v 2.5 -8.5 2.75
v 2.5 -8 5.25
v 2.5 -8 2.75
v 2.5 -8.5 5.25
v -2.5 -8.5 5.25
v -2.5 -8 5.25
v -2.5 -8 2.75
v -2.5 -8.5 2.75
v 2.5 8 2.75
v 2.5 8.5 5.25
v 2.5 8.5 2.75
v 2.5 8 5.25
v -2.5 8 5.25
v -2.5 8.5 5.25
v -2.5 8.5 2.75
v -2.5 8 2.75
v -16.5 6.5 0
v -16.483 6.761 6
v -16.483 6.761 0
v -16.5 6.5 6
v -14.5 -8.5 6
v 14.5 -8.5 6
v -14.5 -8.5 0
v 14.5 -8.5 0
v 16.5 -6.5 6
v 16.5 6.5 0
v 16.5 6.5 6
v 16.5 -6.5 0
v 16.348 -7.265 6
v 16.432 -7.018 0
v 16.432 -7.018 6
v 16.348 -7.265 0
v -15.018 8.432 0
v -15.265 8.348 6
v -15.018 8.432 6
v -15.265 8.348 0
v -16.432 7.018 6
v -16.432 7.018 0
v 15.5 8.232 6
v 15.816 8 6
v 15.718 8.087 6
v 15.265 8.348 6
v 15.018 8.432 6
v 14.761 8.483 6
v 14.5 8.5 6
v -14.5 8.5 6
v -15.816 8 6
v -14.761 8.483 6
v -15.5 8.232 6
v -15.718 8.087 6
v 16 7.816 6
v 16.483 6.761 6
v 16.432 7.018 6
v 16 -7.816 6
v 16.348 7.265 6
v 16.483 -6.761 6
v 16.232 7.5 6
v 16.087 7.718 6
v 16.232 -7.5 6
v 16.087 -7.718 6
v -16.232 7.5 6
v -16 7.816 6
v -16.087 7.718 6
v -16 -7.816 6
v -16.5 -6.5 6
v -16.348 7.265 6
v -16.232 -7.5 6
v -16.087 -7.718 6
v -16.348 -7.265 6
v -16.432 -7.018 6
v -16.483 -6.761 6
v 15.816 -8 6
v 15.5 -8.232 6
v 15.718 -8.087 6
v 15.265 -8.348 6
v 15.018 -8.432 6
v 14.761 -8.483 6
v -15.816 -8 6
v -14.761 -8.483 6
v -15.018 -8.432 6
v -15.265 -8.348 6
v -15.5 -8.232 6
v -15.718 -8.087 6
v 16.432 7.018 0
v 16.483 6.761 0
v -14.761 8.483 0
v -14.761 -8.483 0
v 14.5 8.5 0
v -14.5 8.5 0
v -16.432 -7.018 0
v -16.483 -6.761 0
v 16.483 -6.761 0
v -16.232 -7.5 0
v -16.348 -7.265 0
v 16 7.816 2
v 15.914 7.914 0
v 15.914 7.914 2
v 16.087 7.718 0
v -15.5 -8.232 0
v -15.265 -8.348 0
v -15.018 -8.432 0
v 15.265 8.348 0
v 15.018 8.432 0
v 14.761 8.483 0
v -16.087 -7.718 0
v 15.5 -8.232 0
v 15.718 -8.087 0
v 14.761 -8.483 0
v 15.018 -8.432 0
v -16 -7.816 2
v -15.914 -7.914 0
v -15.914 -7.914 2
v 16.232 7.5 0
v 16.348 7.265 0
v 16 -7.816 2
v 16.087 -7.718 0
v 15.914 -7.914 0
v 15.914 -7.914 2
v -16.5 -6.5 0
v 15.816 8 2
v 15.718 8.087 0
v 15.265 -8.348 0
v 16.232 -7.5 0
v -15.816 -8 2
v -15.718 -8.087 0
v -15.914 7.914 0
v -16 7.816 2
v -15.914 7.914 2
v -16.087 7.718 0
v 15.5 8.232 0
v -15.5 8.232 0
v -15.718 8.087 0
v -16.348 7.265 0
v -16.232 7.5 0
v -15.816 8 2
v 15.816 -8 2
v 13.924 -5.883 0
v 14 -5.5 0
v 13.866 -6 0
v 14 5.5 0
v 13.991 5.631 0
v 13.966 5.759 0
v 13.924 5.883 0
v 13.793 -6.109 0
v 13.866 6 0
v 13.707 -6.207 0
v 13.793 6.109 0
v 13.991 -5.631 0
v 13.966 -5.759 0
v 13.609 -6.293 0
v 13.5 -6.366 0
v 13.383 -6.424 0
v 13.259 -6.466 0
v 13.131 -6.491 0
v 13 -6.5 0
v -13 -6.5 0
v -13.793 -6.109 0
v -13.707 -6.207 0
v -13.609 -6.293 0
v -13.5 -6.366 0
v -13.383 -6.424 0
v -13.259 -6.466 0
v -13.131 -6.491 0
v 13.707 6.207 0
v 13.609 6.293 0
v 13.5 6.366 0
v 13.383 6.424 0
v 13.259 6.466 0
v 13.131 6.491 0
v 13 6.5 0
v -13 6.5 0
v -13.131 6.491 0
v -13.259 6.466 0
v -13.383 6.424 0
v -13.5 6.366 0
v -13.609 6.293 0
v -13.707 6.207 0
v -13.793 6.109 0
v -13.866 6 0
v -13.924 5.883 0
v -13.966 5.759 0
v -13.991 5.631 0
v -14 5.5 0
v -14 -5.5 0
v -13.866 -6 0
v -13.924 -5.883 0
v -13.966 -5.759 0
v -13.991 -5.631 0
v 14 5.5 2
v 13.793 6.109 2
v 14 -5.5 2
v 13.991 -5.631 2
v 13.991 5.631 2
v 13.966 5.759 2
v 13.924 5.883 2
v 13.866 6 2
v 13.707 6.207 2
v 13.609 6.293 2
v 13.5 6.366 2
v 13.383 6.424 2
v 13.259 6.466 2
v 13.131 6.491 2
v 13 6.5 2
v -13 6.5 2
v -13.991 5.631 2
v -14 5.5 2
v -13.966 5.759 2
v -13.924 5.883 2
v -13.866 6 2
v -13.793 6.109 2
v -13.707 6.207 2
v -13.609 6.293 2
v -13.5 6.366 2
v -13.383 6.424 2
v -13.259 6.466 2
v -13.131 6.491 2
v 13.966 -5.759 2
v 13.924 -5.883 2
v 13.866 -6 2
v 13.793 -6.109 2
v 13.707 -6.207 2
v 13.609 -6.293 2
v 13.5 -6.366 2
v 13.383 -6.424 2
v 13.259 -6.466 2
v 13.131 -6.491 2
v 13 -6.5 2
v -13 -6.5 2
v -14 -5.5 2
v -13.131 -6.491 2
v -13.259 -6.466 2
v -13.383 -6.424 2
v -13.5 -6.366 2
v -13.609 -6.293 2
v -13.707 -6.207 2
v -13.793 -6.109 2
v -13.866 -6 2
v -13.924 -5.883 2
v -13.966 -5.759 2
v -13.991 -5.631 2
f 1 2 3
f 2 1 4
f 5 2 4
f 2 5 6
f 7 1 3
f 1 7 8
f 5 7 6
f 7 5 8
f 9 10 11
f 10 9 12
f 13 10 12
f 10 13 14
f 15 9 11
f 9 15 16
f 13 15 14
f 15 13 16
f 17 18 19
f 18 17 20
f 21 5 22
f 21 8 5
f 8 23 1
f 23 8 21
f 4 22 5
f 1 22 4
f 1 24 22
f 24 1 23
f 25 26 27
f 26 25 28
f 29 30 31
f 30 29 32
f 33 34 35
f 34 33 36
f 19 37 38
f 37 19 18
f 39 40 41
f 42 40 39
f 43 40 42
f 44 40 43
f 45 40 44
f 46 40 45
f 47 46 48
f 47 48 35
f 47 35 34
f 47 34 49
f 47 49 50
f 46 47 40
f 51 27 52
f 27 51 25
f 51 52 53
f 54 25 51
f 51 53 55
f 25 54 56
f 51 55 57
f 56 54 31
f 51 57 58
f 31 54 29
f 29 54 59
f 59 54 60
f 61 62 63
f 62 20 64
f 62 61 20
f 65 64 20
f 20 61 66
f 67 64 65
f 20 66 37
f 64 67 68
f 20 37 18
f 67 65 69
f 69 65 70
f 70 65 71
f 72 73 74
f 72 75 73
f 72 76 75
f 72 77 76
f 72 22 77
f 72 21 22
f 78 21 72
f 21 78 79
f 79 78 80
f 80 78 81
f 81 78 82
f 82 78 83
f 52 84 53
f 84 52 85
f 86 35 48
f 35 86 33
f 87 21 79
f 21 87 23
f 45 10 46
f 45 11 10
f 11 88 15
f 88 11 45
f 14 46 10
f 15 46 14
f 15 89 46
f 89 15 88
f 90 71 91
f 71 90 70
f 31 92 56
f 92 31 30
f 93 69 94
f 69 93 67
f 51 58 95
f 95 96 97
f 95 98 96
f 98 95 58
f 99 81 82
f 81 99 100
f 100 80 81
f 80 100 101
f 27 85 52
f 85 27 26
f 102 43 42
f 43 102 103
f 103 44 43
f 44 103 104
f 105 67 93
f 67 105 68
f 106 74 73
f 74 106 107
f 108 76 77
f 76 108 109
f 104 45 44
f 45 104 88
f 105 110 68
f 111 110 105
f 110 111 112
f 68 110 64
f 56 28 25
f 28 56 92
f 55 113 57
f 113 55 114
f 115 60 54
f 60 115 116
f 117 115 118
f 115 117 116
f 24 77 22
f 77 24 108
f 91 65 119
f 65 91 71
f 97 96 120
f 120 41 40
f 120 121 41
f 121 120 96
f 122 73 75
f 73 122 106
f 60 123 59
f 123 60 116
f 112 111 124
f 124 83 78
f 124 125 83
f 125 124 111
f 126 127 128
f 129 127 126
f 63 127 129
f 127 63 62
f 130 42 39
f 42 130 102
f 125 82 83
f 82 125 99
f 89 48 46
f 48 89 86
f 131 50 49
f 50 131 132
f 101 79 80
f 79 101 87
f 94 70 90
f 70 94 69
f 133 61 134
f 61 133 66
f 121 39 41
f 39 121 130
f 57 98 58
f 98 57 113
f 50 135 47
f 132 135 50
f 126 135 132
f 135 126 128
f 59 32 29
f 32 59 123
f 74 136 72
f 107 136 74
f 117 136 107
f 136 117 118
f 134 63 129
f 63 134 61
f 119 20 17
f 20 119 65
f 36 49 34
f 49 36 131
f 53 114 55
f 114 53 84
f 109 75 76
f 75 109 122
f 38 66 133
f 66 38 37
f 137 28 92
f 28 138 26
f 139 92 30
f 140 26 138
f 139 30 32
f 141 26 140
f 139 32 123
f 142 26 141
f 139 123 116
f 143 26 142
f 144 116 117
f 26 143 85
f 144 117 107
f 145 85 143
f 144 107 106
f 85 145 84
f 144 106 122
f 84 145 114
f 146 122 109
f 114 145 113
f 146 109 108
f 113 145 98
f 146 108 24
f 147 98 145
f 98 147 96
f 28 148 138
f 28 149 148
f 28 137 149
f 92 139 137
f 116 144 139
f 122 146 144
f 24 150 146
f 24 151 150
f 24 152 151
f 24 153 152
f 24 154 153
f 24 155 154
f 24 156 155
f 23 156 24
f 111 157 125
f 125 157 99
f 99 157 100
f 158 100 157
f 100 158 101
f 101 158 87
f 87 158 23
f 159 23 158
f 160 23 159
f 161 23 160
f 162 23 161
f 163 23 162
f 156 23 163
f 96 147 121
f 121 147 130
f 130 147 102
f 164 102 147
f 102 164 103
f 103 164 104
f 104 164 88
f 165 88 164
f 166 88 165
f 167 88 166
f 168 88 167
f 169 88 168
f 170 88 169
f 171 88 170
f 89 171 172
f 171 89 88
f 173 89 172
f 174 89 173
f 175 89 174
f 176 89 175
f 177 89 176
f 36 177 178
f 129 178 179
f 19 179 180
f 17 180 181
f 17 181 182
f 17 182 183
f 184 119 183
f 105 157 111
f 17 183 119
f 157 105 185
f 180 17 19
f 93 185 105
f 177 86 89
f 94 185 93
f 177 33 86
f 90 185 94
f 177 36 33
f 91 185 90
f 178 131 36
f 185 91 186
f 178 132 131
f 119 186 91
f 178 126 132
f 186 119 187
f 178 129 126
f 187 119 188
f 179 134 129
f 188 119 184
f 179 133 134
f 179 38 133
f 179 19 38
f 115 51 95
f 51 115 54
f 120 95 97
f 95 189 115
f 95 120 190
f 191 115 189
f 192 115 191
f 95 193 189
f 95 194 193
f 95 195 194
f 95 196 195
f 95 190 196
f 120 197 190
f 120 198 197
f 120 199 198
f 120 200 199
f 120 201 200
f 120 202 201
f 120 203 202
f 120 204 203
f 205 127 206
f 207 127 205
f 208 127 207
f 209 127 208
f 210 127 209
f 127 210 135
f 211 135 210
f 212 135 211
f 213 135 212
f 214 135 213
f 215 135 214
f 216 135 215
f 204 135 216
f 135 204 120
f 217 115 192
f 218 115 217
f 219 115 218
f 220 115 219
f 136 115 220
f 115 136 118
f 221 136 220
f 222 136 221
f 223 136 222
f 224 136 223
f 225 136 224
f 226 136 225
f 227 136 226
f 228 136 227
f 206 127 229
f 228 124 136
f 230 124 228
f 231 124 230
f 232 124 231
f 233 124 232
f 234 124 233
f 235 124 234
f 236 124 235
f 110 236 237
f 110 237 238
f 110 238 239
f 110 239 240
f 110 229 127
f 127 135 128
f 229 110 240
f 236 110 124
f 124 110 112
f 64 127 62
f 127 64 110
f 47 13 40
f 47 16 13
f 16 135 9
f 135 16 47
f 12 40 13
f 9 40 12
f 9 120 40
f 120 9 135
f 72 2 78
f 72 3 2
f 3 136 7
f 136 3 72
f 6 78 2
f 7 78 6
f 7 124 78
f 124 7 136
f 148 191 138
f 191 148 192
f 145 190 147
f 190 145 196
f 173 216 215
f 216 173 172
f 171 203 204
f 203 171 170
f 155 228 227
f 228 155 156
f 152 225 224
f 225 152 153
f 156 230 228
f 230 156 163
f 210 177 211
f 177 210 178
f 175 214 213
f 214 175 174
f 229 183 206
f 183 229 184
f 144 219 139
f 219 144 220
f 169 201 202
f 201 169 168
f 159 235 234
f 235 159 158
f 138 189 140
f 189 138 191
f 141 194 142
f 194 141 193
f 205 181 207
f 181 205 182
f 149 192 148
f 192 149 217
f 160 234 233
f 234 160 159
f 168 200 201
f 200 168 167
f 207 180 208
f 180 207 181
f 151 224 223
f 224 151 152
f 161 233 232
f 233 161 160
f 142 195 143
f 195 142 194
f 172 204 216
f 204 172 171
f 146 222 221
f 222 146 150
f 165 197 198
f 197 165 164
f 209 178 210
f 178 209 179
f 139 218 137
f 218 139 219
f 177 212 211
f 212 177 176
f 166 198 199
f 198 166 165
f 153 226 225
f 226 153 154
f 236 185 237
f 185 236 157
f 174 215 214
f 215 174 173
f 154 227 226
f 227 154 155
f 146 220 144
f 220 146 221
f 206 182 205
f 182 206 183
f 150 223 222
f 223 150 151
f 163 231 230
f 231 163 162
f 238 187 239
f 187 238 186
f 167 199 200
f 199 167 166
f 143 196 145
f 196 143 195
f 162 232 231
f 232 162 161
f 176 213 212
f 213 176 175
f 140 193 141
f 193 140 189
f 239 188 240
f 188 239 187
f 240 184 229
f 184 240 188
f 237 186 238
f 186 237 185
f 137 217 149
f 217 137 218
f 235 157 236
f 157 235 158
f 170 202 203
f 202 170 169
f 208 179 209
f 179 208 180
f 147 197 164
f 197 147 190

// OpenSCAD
// file: insert_base.scad
// ============================================
// MODULAR CABLE ORGANIZER - BASE INSERT MODULE
// ============================================
// This is the parent module for all insert types
// Include this file and call insert_with_port() with a port shape
// ============================================

include <parameters.scad>

// === BASE INSERT WITH CUSTOM BODY DEPTH ===
module insert_blank_custom(body_depth) {
    union() {
        // Base plate (sits in frame slot)
        rounded_box_rect(insert_width, insert_height, insert_base_depth, 1.5);
        
        // Body (protrudes out front) - custom depth
        translate([0, 0, insert_base_depth])
            rounded_box_rect(insert_body_width, insert_body_height, body_depth, 2);
        
        // Snap tabs on all 4 sides
        snap_tabs_all();
    }
}

// === BASE INSERT (default depth - for backwards compatibility) ===
module insert_blank() {
    insert_blank_custom(insert_body_depth);
}

// === INSERT WITH THROUGH-HOLE PORT (custom depth) ===
// Pass body_depth and a 2D shape as children
module insert_with_port_custom(body_depth) {
    total_depth = insert_base_depth + body_depth;
    difference() {
        insert_blank_custom(body_depth);
        
        // Cut port hole ALL THE WAY through (tube shape)
        translate([0, 0, -0.1])
            linear_extrude(total_depth + 0.2)
            offset(r=port_clearance)  // Add clearance to port opening
            children();
    }
}

// === INSERT WITH THROUGH-HOLE PORT (default depth) ===
module insert_with_port() {
    insert_with_port_custom(insert_body_depth) children();
}

// === PRE-MADE INSERT MODULES WITH CORRECT DEPTHS ===
module insert_usbc() {
    insert_with_port_custom(usbc_body_depth) port_usbc();
}

module insert_usba() {
    insert_with_port_custom(usba_body_depth) port_usba();
}

module insert_usb_mini() {
    insert_with_port_custom(usb_mini_body_depth) port_usb_mini();
}

module insert_usb_micro() {
    insert_with_port_custom(usb_micro_body_depth) port_usb_micro();
}

module insert_usb_b() {
    insert_with_port_custom(usb_b_body_depth) port_usb_b();
}

module insert_lightning() {
    insert_with_port_custom(lightning_body_depth) port_lightning();
}

module insert_hdmi() {
    insert_with_port_custom(hdmi_body_depth) port_hdmi();
}

module insert_audio_jack() {
    insert_with_port_custom(audio_jack_body_depth) port_audio_jack();
}

// === SNAP TABS (on neck/body - catch on frame cutouts) ===
// Tabs are on the body, positioned to engage with frame wall cutouts
module snap_tabs_all() {
    // Position tabs up on body (clear of base/frame)
    tab_z = insert_base_depth + snap_tab_offset;
    
    // Tabs on all 4 sides of the body
    for (angle = [0, 90, 180, 270]) {
        rotate([0, 0, angle])
            translate([0, insert_body_height/2, tab_z])
            neck_snap_tab();
    }
}

module neck_snap_tab() {
    // Wedge shape (FLIPPED): 
    // - Peak/taper on BOTTOM - slides past back plate when inserting
    // - Flat on TOP - catches and holds
    hull() {
        // Peak of wedge (protruding, at BOTTOM of tab)
        translate([-snap_tab_width/2, snap_tab_protrude, 0])
            cube([snap_tab_width, 0.1, 0.1]);
        // Flat top (at body surface, TOP of tab)
        translate([-snap_tab_width/2, 0, snap_tab_thick])
            cube([snap_tab_width, 0.1, 0.1]);
        // Base of wedge (at body surface, bottom)
        translate([-snap_tab_width/2, 0, 0])
            cube([snap_tab_width, 0.1, 0.1]);
    }
}

module snap_tab_horizontal() {
    hull() {
        translate([0, -snap_tab_protrude/2, 0])
            cube([snap_tab_width, 0.1, snap_tab_thick], center=true);
        translate([0, snap_tab_protrude/2, snap_tab_thick * 0.2])
            cube([snap_tab_width, 0.1, snap_tab_thick * 0.6], center=true);
    }
}

module snap_tab_vertical() {
    hull() {
        translate([-snap_tab_protrude/2, 0, 0])
            cube([0.1, snap_tab_width, snap_tab_thick], center=true);
        translate([snap_tab_protrude/2, 0, snap_tab_thick * 0.2])
            cube([0.1, snap_tab_width, snap_tab_thick * 0.6], center=true);
    }
}

// === UTILITY MODULES ===
module rounded_box_rect(w, d, h, r) {
    translate([0, 0, h/2])
        hull() {
            for (x = [-1, 1], y = [-1, 1])
                translate([x * (w/2 - r), y * (d/2 - r), 0])
                    cylinder(h=h, r=r, center=true);
        }
}

// === PORT SHAPE MODULES (2D) ===
// These define the cutout shapes for each connector type

module port_rounded_rect(w, h, r) {
    // Standard rounded rectangle
    hull() {
        for (x = [-1, 1], y = [-1, 1])
            translate([x * (w/2 - r), y * (h/2 - r)])
                circle(r=r);
    }
}

module port_usbc() {
    port_rounded_rect(usbc_w, usbc_h, usbc_r);
}

module port_usba() {
    port_rounded_rect(usba_w, usba_h, usba_r);
}

module port_usb_mini() {
    port_rounded_rect(usb_mini_w, usb_mini_h, usb_mini_r);
}

module port_usb_micro() {
    port_rounded_rect(usb_micro_w, usb_micro_h, usb_micro_r);
}

module port_usb_b() {
    // USB-B has beveled top corners
    hull() {
        // Bottom corners (full radius)
        for (x = [-1, 1])
            translate([x * (usb_b_w/2 - usb_b_r), -(usb_b_h/2 - usb_b_r)])
                circle(r=usb_b_r);
        // Top corners (chamfered - moved inward)
        for (x = [-1, 1])
            translate([x * (usb_b_w/2 - usb_b_r - 1), (usb_b_h/2 - usb_b_r)])
                circle(r=usb_b_r);
    }
}

module port_lightning() {
    port_rounded_rect(lightning_w, lightning_h, lightning_r);
}

module port_hdmi() {
    // HDMI is tapered (wider at top)
    hull() {
        // Top (wider)
        for (x = [-1, 1])
            translate([x * (hdmi_w/2 - hdmi_r), (hdmi_h/2 - hdmi_r)])
                circle(r=hdmi_r);
        // Bottom (narrower)
        for (x = [-1, 1])
            translate([x * (hdmi_w/2 - hdmi_r - 1), -(hdmi_h/2 - hdmi_r)])
                circle(r=hdmi_r);
    }
}

module port_audio_jack() {
    circle(d=audio_jack_dia);
}

module port_label_recess() {
    // Shallow rectangular recess for labels
    square([label_w, label_h], center=true);
}

// === RENDER (for testing this file directly) ===
// insert_blank();
// file: parameters.scad
// ============================================
// MODULAR CABLE ORGANIZER - SHARED PARAMETERS
// ============================================
// All dimensions in mm - include this in all files
// ============================================

$fn = 48;

// === TOLERANCES ===
clearance = 0.3;
port_clearance = 0.1;  // Extra clearance for port openings (reduced - 0.2 was too loose for USB-C)
wall = 1.6;

// === SLOT DIMENSIONS (2:1 aspect ratio) - scaled to 2/3 ===
slot_width = 32;  // Reduced by 1mm for more compact insert
slot_height = 16;  // Reduced by 1mm for more compact insert
slot_depth = 4;  // Reduced from 6mm - less frame depth needed

// === FRAME STRUCTURE ===
frame_wall = 0.5;   // Reduced for more compact frame
frame_border = 8;  // Increased by 10mm for mounting holes with countersink
frame_back = 2;     // Slightly thicker for snap catch strength
mount_hole_dia = 3;
countersink_dia = 6;  // Diameter of countersink for screw heads
countersink_depth = 2;  // Depth of countersink

// === GRID ===
grid_cols = 2;
grid_rows = 2;

// === INSERT BASE DIMENSIONS ===
insert_width = slot_width - (2 * clearance);
insert_height = slot_height - (2 * clearance);
insert_base_depth = slot_depth - 0.5;

// === INSERT BODY (protrudes from frame) ===
insert_body_width = insert_width - 4;
insert_body_height = insert_height - 3;
insert_body_depth = 12;  // Deep enough to accommodate male cable connectors
insert_top_thick = 1.5;  // Top platform thickness

// === SNAP TABS (on neck/body - catch on back plate) ===
snap_tab_width = 4;
snap_tab_protrude = 1.2;  // How far tab sticks out from body
snap_tab_thick = 1.5;     // Z thickness of tab
snap_tab_offset = 2.2;      // Distance from base to tab bottom on insert (increased to clear frame)

// === CONNECTOR PORT DIMENSIONS & BODY DEPTHS ===
// Port dimensions from reference blueprints
// Body depths sized to match typical male connector lengths

// USB-C: 8.4 x 2.6mm, male connector ~9mm
usbc_w = 8.4;
usbc_h = 2.6;
usbc_r = 1.0;
usbc_body_depth = 9;

// USB-A: 14.0 x 6.5mm, male connector ~13mm
usba_w = 14.0;
usba_h = 6.5;
usba_r = 0.5;
usba_body_depth = 13;

// USB Mini: 6.9 x 3.0mm, male connector ~9mm
usb_mini_w = 6.9;
usb_mini_h = 3.0;
usb_mini_r = 0.5;
usb_mini_body_depth = 9;

// USB Micro: 6.9 x 1.8mm, male connector ~7mm
usb_micro_w = 6.9;
usb_micro_h = 1.8;
usb_micro_r = 0.3;
usb_micro_body_depth = 7;

// USB-B: 8.0 x 7.5mm, male connector ~14mm
usb_b_w = 8.0;
usb_b_h = 7.5;
usb_b_r = 1.0;
usb_b_body_depth = 14;

// Lightning: 6.7 x 1.5mm, male connector ~8mm
lightning_w = 6.7;
lightning_h = 1.5;
lightning_r = 0.5;
lightning_body_depth = 8;

// HDMI: 14.0 x 4.5mm, male connector ~16mm
hdmi_w = 14.0;
hdmi_h = 4.5;
hdmi_r = 0.5;
hdmi_body_depth = 16;

// 3.5mm Audio Jack: male plug ~14mm
audio_jack_dia = 6.0;
audio_jack_body_depth = 14;

// Blank/Label: recessed area for label
label_w = 30;
label_h = 12;
label_depth = 0.8;

// === CALCULATED VALUES ===
frame_total_depth = frame_back + slot_depth;
grid_width = (grid_cols * slot_width) + ((grid_cols - 1) * frame_wall);
grid_height = (grid_rows * slot_height) + ((grid_rows - 1) * frame_wall);
frame_width = grid_width + (2 * frame_border);
frame_height_total = grid_height + (2 * frame_border);
insert_total_depth = insert_base_depth + insert_body_depth;
// main file
// ============================================
// PRINT FILE: Single Slot Frame
// ============================================
// Export this to STL for 3D printing
// Print flat side down (no supports needed)
// ============================================

include <parameters.scad>
include <insert_base.scad>

// Single slot frame module
module print_frame() {
    outer_w = slot_width + (2 * frame_wall);
    outer_h = slot_height + (2 * frame_wall);
    
    difference() {
        // Outer body
        rounded_box_rect(outer_w, outer_h, frame_total_depth, 2);
        
        // Main slot cutout (from back to front)
        translate([0, 0, frame_back + slot_depth/2 + 0.1])
            cube([slot_width, slot_height, slot_depth + 0.2], center=true);
        
        // Back opening (smaller, for insert body to pass through)
        translate([0, 0, -0.1])
            rounded_box_rect(insert_body_width + 2*clearance, 
                            insert_body_height + 2*clearance, 
                            frame_back + 0.2, 1);
        
        // Tab engagement cutouts
        tab_cutouts();
    }
}

// Tab engagement cutouts in frame OUTER WALLS
// These create pockets in the slot walls for snap tabs to engage with
module tab_cutouts() {
    // Cutout dimensions
    tab_cutout_width = snap_tab_width + 1;  // Width along X (parallel to wall)
    tab_cutout_height = snap_tab_thick + 1;  // Height in Z
    tab_cutout_into_wall = (snap_tab_protrude + 1) / 2;  // How deep into wall material (half depth)
    
    // Z position: moved up into the slot (away from back plate)
    // Position about halfway up the slot depth
    cutout_z = frame_back + slot_depth/2;
    
    // Slot wall position (outer edge of slot cavity)
    wall_y = slot_height/2;
    
    // Cutouts ONLY on +Y and -Y walls (the LONG sides - top and bottom)
    // Positioned at the outer wall, extending INTO the frame material
    for (ym = [-1, 1]) {
        translate([0, ym * (wall_y + tab_cutout_into_wall/2 - 0.1), cutout_z])
            cube([tab_cutout_width, tab_cutout_into_wall + 0.2, tab_cutout_height], center=true);
    }
}

// Render for export
print_frame();
